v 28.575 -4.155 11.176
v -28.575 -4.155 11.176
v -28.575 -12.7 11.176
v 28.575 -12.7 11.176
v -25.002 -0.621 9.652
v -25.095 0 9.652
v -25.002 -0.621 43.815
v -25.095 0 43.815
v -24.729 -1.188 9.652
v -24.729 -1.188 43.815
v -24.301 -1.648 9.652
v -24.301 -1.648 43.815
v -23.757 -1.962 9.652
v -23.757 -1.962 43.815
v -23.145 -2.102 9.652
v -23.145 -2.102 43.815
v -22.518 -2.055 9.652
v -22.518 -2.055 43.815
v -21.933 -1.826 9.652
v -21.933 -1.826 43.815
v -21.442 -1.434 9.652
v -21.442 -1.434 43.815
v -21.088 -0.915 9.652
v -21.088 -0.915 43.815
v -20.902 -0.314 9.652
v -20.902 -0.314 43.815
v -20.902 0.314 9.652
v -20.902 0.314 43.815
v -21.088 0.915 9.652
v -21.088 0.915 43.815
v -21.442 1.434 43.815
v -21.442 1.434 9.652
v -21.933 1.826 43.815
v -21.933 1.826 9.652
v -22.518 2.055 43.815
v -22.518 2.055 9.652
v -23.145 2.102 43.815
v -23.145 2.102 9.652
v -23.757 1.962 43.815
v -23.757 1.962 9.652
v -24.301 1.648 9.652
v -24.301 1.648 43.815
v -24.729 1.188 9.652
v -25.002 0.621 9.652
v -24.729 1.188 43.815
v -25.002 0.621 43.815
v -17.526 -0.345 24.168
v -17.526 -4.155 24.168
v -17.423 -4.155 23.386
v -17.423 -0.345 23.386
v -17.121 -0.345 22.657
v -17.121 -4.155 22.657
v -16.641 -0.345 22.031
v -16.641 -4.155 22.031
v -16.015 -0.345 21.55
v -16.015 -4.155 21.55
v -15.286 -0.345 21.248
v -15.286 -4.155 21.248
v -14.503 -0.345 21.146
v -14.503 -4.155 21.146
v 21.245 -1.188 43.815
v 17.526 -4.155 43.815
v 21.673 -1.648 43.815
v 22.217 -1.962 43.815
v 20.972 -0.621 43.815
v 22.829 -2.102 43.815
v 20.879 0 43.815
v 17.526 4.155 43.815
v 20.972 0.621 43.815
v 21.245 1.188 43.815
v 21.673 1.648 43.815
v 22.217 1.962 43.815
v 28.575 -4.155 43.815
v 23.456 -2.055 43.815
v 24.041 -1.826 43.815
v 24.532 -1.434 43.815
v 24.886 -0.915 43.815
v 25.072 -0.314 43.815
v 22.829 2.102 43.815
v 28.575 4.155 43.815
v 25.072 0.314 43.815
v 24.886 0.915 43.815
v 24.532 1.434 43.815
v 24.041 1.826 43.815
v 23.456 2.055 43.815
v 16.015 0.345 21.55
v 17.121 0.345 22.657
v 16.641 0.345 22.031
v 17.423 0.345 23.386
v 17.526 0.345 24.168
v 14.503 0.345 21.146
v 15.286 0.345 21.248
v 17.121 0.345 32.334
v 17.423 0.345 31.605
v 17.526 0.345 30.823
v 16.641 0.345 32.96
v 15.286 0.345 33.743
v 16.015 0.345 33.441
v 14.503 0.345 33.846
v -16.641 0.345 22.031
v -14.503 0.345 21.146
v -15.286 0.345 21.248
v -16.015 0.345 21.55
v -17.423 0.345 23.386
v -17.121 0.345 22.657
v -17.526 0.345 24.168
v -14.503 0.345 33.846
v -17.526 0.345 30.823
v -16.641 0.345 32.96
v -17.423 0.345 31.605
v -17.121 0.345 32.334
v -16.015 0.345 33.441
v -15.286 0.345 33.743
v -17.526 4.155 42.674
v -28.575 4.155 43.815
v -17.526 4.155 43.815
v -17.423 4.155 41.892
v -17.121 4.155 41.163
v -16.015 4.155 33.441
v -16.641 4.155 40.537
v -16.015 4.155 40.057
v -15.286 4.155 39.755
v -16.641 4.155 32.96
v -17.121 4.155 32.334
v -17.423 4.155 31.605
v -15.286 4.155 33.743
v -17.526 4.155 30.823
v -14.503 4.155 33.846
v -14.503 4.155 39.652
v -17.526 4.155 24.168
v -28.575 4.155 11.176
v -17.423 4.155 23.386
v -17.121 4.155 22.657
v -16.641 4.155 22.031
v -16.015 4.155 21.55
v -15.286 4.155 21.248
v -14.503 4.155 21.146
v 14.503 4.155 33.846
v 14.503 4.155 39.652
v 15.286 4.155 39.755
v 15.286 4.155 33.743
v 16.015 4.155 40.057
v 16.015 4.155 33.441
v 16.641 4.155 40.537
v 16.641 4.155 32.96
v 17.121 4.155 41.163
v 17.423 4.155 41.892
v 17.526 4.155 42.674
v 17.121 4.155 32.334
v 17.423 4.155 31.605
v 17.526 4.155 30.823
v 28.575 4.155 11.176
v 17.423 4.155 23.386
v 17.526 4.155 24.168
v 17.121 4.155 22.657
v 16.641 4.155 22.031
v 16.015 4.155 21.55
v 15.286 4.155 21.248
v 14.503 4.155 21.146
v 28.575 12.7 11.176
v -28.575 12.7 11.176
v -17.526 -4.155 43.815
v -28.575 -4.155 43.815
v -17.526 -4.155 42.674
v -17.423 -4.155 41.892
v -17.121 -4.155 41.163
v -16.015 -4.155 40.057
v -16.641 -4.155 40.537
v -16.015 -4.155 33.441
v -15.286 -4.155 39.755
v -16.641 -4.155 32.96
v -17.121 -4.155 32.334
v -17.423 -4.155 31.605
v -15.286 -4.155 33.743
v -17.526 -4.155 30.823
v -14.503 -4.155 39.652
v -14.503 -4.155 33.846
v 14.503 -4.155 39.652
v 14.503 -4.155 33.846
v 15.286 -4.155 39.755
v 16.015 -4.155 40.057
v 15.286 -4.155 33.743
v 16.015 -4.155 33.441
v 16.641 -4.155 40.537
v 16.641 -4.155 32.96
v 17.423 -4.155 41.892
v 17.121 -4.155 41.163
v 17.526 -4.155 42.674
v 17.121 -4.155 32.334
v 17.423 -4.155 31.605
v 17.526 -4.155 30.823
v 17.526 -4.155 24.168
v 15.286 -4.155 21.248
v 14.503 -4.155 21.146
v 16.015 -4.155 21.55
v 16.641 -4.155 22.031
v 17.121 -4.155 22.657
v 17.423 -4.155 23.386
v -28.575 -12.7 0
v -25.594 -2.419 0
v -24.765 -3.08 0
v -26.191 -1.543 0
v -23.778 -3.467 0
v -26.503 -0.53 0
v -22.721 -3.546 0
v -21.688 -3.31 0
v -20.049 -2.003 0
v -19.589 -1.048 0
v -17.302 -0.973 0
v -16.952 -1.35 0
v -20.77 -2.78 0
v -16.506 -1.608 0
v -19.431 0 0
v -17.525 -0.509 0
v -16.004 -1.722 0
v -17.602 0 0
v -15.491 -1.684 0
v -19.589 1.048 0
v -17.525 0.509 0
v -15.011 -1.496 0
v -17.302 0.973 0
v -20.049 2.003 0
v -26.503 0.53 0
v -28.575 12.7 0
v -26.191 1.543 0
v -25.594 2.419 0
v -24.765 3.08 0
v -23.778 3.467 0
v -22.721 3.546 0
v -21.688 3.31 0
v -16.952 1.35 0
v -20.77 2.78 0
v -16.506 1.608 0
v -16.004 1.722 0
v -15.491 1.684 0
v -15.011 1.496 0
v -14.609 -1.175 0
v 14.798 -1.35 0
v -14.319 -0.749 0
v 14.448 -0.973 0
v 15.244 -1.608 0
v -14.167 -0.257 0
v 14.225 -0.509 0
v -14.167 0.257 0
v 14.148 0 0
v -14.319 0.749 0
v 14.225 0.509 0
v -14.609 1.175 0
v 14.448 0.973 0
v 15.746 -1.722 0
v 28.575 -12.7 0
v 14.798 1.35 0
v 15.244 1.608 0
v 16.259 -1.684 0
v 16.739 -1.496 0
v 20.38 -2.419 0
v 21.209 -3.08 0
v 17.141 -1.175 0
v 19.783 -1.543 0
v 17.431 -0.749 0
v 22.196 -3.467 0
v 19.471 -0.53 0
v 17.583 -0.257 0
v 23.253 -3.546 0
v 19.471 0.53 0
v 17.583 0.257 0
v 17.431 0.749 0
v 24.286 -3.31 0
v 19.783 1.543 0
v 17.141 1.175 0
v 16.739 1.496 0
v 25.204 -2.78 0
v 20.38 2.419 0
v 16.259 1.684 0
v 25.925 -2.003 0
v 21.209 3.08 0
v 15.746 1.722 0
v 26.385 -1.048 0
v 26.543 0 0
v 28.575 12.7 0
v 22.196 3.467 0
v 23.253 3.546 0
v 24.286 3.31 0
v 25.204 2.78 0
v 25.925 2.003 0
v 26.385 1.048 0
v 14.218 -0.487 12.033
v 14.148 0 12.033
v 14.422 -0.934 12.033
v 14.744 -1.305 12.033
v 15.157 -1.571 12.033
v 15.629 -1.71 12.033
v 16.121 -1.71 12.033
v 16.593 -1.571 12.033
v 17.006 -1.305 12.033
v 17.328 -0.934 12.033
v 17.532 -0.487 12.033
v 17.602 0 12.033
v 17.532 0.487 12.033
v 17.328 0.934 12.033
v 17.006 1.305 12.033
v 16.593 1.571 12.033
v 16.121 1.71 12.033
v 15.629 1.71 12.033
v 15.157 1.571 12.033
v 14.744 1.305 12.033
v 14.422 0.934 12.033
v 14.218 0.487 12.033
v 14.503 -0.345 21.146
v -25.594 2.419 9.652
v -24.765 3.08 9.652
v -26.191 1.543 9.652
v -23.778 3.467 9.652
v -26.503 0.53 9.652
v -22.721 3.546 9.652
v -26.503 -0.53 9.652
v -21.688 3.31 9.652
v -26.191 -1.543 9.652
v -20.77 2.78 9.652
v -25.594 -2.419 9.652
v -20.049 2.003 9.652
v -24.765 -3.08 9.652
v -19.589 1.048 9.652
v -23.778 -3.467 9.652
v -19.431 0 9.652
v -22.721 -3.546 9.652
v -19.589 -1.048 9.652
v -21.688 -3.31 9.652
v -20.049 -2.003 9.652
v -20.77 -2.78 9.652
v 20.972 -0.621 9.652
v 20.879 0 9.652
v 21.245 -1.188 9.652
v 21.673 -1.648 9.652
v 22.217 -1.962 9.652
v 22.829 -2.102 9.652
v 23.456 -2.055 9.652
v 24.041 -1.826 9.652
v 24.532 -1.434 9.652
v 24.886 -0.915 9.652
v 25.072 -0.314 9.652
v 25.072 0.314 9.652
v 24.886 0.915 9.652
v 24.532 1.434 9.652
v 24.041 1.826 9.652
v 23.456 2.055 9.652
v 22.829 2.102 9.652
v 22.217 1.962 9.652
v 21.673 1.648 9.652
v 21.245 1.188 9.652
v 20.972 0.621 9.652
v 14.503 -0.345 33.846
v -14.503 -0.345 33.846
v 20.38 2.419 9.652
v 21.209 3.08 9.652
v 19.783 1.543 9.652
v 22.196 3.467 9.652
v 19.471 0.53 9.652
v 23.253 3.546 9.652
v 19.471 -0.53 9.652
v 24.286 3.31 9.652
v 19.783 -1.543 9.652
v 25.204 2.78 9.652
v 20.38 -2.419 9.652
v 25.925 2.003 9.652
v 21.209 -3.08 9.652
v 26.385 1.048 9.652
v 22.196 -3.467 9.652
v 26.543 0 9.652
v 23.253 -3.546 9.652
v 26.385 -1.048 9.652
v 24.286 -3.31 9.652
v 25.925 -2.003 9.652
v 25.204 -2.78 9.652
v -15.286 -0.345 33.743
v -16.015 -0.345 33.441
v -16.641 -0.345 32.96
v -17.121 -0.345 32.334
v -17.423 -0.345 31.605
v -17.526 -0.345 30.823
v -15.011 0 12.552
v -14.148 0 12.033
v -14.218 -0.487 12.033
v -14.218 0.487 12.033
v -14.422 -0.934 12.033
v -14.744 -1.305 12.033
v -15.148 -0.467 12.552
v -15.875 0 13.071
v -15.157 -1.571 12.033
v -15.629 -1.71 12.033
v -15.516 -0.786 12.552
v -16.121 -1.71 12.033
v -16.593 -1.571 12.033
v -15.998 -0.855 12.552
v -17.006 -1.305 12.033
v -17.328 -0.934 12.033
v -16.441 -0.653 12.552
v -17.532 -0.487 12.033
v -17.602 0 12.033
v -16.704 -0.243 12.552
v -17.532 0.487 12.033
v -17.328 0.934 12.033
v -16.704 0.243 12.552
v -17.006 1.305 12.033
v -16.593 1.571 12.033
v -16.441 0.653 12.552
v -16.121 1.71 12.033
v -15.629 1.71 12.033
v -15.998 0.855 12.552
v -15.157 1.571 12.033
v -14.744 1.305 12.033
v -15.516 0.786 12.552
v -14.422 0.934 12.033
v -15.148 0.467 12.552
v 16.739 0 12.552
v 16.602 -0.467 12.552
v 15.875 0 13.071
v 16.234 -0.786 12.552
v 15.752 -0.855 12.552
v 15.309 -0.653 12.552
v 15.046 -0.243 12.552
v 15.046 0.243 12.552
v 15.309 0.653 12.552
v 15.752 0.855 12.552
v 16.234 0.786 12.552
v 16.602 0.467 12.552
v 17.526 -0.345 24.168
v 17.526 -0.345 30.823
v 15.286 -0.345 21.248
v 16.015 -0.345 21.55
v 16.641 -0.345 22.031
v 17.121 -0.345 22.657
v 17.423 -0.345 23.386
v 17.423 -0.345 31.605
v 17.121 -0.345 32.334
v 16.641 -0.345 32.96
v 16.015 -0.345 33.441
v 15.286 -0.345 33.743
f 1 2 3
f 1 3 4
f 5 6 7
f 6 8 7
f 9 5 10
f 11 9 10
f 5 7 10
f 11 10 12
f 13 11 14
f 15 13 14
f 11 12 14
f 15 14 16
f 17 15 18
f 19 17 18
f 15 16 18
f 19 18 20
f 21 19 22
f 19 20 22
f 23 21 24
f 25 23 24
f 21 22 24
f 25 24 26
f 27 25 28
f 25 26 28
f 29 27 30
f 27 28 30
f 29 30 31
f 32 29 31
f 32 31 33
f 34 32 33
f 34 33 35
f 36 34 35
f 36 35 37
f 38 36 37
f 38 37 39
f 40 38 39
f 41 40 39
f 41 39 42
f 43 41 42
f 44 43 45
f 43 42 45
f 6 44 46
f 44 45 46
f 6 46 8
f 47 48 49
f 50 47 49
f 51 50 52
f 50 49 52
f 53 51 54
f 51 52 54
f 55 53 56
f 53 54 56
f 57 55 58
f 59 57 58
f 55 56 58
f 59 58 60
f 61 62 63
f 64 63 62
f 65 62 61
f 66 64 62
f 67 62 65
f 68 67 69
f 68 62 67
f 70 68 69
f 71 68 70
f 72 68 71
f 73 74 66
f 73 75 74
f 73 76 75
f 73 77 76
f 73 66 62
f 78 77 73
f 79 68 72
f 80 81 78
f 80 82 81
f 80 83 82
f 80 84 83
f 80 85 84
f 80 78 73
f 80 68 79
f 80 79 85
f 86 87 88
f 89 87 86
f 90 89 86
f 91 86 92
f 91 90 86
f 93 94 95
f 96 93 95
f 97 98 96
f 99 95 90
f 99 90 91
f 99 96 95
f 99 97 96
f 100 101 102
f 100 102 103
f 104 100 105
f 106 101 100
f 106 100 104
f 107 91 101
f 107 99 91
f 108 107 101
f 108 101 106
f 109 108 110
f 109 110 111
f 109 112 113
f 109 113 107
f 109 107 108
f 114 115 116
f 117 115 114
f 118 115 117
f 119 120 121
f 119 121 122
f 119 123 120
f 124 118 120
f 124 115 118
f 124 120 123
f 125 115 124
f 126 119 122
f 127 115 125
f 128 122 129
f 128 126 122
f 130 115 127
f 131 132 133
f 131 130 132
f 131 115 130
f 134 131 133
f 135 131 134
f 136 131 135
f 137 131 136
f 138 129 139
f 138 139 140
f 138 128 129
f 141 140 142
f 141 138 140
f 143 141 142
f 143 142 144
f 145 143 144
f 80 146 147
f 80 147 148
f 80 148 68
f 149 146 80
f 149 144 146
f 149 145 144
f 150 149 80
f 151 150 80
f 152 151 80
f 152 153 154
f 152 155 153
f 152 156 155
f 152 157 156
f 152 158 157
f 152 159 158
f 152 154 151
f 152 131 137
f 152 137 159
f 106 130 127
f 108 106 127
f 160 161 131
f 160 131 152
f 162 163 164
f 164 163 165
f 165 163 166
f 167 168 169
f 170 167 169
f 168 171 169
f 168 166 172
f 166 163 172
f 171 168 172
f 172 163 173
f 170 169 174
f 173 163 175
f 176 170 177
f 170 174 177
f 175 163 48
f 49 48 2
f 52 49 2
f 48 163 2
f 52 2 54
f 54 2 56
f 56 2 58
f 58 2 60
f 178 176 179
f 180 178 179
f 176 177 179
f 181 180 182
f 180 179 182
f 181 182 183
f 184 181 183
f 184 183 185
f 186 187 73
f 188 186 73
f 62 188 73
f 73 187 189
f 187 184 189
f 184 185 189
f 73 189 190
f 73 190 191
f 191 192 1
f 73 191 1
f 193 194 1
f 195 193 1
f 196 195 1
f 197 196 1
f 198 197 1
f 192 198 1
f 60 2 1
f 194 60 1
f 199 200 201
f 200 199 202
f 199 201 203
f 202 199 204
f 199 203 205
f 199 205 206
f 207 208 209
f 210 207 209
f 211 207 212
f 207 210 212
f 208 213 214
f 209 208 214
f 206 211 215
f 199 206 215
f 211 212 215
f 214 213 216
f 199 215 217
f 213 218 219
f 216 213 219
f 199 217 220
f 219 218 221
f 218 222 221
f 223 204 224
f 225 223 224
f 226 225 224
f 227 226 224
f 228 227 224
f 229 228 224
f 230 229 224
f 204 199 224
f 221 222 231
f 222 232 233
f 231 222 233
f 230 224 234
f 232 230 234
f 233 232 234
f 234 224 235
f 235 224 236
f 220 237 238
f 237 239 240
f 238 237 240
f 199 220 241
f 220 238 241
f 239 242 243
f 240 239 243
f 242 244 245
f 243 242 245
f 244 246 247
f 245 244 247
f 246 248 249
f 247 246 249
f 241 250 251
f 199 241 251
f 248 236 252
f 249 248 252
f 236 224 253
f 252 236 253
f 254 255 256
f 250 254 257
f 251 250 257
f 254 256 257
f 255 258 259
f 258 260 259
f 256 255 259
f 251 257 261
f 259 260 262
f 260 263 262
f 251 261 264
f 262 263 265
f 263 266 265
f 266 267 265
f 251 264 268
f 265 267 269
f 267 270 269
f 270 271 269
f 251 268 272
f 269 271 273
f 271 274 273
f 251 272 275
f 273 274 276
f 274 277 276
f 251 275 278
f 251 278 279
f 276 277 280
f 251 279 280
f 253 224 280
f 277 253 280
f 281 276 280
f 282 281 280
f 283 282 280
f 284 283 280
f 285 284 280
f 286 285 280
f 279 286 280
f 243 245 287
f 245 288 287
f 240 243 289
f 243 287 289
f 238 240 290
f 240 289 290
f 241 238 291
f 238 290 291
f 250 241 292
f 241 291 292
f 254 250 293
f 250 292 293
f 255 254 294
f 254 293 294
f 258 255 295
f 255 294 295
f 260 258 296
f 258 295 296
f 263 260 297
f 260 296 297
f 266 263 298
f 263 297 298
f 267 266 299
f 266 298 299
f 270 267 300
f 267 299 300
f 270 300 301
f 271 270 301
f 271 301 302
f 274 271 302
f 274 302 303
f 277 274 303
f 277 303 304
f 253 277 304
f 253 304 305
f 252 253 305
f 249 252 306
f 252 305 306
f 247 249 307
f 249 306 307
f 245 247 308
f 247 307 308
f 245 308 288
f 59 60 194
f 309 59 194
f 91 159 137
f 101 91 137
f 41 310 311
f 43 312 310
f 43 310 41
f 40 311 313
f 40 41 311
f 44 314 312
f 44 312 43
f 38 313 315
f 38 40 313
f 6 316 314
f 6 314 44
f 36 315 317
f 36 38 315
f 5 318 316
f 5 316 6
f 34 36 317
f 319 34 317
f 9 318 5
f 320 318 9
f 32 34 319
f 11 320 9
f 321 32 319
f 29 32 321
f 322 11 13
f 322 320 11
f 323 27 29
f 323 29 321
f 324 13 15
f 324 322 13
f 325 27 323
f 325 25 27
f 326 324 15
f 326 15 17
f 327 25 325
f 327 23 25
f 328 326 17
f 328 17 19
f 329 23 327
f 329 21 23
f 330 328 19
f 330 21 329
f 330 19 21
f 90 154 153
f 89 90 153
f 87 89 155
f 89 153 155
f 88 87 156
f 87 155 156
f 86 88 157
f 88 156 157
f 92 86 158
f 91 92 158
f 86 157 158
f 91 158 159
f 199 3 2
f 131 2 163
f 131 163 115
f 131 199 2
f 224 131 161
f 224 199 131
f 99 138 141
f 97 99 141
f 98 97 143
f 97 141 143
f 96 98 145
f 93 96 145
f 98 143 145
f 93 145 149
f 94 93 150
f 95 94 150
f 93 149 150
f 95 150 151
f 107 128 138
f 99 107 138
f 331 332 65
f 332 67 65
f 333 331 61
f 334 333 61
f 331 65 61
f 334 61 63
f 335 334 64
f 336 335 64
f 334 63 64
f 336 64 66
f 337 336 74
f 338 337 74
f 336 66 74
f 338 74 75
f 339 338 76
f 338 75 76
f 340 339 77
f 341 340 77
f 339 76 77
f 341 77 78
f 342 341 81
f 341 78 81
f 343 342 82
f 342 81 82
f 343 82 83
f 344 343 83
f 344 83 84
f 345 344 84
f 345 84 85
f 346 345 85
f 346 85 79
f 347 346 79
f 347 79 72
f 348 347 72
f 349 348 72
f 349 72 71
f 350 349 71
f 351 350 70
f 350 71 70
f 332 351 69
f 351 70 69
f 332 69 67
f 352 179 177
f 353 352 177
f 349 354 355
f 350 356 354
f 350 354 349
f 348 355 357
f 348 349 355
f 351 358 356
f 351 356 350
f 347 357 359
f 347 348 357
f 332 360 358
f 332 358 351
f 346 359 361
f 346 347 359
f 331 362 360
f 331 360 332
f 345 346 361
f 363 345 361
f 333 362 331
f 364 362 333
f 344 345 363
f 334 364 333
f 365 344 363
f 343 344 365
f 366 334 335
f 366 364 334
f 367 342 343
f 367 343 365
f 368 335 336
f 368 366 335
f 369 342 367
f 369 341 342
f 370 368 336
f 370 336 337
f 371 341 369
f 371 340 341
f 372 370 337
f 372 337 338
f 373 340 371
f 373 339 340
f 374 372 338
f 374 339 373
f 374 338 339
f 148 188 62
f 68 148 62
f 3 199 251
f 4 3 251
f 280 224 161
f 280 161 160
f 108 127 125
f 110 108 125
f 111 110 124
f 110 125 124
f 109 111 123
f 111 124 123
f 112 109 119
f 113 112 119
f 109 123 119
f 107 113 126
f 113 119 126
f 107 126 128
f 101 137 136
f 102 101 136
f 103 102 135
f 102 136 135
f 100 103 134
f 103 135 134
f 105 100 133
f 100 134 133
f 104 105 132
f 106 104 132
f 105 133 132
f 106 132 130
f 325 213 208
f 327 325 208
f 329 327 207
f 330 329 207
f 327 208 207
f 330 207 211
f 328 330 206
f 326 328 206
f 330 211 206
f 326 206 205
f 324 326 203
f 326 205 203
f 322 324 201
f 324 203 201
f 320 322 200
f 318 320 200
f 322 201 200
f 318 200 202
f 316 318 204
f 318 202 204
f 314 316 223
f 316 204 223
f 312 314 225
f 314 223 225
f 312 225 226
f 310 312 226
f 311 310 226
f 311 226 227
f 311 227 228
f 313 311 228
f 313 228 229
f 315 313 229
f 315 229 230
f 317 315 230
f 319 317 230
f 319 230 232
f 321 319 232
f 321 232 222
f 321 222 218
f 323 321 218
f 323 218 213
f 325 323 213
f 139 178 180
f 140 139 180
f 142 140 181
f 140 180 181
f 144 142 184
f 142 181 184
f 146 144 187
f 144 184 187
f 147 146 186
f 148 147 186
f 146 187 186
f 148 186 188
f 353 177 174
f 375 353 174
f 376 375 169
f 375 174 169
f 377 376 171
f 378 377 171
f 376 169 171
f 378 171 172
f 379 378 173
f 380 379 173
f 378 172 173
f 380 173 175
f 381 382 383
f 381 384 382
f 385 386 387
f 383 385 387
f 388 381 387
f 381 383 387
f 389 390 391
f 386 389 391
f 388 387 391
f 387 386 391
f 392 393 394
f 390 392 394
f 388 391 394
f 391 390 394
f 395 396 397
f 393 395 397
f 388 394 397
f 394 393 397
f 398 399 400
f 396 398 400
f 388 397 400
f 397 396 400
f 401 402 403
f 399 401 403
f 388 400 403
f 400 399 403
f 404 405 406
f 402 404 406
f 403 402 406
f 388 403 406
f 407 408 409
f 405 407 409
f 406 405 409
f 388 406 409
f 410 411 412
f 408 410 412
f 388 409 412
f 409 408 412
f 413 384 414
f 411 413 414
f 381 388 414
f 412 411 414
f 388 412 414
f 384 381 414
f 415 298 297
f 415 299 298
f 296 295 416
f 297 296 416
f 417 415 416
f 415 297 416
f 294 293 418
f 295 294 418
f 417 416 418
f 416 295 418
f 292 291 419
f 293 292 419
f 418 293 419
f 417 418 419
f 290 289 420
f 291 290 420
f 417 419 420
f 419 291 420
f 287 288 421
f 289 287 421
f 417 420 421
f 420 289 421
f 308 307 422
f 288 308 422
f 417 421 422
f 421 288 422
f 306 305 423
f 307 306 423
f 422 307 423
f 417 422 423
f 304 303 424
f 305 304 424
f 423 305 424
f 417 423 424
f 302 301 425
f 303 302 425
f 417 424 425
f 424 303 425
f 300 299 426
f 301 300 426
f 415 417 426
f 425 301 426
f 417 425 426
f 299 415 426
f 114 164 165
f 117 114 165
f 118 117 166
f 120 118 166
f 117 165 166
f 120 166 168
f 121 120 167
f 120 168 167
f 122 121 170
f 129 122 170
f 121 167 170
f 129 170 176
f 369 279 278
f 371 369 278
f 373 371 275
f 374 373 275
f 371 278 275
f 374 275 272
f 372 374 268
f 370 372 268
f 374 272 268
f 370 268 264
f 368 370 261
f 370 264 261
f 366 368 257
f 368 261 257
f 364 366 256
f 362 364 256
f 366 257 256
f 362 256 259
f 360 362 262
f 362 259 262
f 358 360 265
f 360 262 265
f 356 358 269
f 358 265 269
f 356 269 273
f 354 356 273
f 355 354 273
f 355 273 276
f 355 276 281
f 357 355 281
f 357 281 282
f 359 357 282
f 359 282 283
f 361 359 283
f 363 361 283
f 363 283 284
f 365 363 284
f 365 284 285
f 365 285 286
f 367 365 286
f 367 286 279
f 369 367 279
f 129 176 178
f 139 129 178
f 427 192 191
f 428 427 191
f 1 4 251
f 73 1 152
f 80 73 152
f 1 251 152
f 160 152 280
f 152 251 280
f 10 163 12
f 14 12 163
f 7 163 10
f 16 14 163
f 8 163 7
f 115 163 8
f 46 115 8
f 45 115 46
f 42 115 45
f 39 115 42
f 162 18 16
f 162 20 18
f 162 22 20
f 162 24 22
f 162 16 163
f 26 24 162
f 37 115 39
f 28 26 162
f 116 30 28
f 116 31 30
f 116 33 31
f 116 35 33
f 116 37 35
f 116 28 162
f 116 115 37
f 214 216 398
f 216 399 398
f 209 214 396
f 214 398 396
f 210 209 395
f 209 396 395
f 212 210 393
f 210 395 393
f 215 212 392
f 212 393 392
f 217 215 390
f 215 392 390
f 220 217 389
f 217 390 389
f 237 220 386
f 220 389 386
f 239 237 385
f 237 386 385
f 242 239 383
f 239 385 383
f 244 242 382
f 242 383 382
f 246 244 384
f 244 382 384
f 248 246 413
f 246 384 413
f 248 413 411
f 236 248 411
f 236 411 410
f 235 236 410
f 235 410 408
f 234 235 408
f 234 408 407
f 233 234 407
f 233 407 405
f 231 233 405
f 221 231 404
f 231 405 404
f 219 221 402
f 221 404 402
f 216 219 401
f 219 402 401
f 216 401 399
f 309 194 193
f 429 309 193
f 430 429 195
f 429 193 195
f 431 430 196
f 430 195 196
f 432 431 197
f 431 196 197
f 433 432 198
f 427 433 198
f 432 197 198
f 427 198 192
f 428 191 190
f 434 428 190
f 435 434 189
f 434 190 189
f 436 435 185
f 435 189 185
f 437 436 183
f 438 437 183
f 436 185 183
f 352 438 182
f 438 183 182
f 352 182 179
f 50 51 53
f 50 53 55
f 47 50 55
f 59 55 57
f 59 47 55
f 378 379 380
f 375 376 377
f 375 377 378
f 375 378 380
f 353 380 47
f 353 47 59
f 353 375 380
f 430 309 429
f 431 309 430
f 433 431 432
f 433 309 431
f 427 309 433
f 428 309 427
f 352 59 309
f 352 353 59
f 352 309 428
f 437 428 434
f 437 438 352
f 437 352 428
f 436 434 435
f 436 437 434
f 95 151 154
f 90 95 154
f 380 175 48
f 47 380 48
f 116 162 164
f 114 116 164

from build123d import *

# Parameters (mm, degrees)
F0_W            = 57.15
F0_H            = 25.4
F1_DEPTH        = 11.176
F2_W            = 57.15
F2_H            = 8.3099603653
F3_DEPTH        = 32.639
F5_DEPTH        = 3.81
F6_DEPTH        = 16.8559801826
F8_DEPTH        = 3.81
F10_D           = 4.2164
F10_CBORE_D     = 7.112
F10_CBORE_DEPTH = 9.652
F11_D           = 3.4544
F11_DEPTH       = 12.03325
F11_TIP         = 1.0378064612


with BuildPart() as f1:
    # F0 (on Top) → F1 (new body)
    with BuildSketch(Plane.XY):
        Rectangle(F0_W, F0_H)
    extrude(amount=F1_DEPTH)

    # F2 (on face) → F3 (join)
    with BuildSketch(Plane.XY.offset(11.176)):
        Rectangle(F2_W, F2_H)
    extrude(amount=F3_DEPTH)

    # F4 (on face) → F5 (cut)
    with BuildSketch(Plane.XZ.offset(4.1549801826)):
        with BuildLine():
            ThreePointArc((17.526, 30.8229), (16.6407009568, 32.9602009568), (14.5034, 33.8455))
            Line((14.5034, 33.8455), (-14.5034, 33.8455))
            ThreePointArc((-14.5034, 33.8455), (-16.6407009568, 32.9602009568), (-17.526, 30.8229))
            Line((-17.526, 30.8229), (-17.526, 24.1681))
            ThreePointArc((-17.526, 24.1681), (-16.6407009568, 22.0307990432), (-14.5034, 21.1455))
            Line((-14.5034, 21.1455), (14.5034, 21.1455))
            ThreePointArc((14.5034, 21.1455), (16.6407009568, 22.0307990432), (17.526, 24.1681))
            Line((17.526, 24.1681), (17.526, 30.8229))
        make_face()
    extrude(amount=-F5_DEPTH, mode=Mode.SUBTRACT)

    # F4 (on face) → F6 (cut, through all)
    with BuildSketch(Plane.XZ.offset(4.1549801826)):
        with BuildLine():
            ThreePointArc((-17.526, 42.6742546607), (-16.6407009568, 40.5369537039), (-14.5034, 39.6516546607))
            Line((-14.5034, 39.6516546607), (14.5034, 39.6516546607))
            ThreePointArc((14.5034, 39.6516546607), (16.6407009568, 40.5369537039), (17.526, 42.6742546607))
            Line((17.526, 42.6742546607), (17.526, 43.815))
            Line((17.526, 43.815), (-17.526, 43.815))
            Line((-17.526, 43.815), (-17.526, 42.6742546607))
        make_face()
    extrude(amount=-F6_DEPTH, mode=Mode.SUBTRACT)

    # F7 (on face) → F8 (cut)
    with BuildSketch(Plane(origin=(0, 4.1549801826, 0), x_dir=(-1, 0, 0), z_dir=(0, 1, 0))):
        with BuildLine():
            ThreePointArc((-14.5034, 33.8455), (-16.6407009568, 32.9602009568), (-17.526, 30.8229))
            Line((-17.526, 30.8229), (-17.526, 24.1681))
            ThreePointArc((-17.526, 24.1681), (-16.6407009568, 22.0307990432), (-14.5034, 21.1455))
            Line((-14.5034, 21.1455), (14.5034, 21.1455))
            ThreePointArc((14.5034, 21.1455), (16.6407009568, 22.0307990432), (17.526, 24.1681))
            Line((17.526, 24.1681), (17.526, 30.8229))
            ThreePointArc((17.526, 30.8229), (16.6407009568, 32.9602009568), (14.5034, 33.8455))
            Line((14.5034, 33.8455), (-14.5034, 33.8455))
        make_face()
    extrude(amount=-F8_DEPTH, mode=Mode.SUBTRACT)

    # F10 (through all)
    with Locations(Plane(origin=(0, 0, 0), x_dir=(1, 0, 0), z_dir=(0, 0, -1))):
        with Locations((-22.987, 0), (22.987, 0)):
            CounterBoreHole(F10_D / 2, F10_CBORE_D / 2, F10_CBORE_DEPTH)

    # F11
    with Locations(Plane(origin=(0, 0, 0), x_dir=(1, 0, 0), z_dir=(0, 0, -1))):
        with Locations((-15.875, 0), (15.875, 0)):
            Hole(F11_D / 2, depth=F11_DEPTH)
            with Locations((0, 0, -(F11_DEPTH + F11_TIP / 2))):  # 118° drill point
                Cone(0, F11_D / 2, F11_TIP, mode=Mode.SUBTRACT)


solid = f1.part
